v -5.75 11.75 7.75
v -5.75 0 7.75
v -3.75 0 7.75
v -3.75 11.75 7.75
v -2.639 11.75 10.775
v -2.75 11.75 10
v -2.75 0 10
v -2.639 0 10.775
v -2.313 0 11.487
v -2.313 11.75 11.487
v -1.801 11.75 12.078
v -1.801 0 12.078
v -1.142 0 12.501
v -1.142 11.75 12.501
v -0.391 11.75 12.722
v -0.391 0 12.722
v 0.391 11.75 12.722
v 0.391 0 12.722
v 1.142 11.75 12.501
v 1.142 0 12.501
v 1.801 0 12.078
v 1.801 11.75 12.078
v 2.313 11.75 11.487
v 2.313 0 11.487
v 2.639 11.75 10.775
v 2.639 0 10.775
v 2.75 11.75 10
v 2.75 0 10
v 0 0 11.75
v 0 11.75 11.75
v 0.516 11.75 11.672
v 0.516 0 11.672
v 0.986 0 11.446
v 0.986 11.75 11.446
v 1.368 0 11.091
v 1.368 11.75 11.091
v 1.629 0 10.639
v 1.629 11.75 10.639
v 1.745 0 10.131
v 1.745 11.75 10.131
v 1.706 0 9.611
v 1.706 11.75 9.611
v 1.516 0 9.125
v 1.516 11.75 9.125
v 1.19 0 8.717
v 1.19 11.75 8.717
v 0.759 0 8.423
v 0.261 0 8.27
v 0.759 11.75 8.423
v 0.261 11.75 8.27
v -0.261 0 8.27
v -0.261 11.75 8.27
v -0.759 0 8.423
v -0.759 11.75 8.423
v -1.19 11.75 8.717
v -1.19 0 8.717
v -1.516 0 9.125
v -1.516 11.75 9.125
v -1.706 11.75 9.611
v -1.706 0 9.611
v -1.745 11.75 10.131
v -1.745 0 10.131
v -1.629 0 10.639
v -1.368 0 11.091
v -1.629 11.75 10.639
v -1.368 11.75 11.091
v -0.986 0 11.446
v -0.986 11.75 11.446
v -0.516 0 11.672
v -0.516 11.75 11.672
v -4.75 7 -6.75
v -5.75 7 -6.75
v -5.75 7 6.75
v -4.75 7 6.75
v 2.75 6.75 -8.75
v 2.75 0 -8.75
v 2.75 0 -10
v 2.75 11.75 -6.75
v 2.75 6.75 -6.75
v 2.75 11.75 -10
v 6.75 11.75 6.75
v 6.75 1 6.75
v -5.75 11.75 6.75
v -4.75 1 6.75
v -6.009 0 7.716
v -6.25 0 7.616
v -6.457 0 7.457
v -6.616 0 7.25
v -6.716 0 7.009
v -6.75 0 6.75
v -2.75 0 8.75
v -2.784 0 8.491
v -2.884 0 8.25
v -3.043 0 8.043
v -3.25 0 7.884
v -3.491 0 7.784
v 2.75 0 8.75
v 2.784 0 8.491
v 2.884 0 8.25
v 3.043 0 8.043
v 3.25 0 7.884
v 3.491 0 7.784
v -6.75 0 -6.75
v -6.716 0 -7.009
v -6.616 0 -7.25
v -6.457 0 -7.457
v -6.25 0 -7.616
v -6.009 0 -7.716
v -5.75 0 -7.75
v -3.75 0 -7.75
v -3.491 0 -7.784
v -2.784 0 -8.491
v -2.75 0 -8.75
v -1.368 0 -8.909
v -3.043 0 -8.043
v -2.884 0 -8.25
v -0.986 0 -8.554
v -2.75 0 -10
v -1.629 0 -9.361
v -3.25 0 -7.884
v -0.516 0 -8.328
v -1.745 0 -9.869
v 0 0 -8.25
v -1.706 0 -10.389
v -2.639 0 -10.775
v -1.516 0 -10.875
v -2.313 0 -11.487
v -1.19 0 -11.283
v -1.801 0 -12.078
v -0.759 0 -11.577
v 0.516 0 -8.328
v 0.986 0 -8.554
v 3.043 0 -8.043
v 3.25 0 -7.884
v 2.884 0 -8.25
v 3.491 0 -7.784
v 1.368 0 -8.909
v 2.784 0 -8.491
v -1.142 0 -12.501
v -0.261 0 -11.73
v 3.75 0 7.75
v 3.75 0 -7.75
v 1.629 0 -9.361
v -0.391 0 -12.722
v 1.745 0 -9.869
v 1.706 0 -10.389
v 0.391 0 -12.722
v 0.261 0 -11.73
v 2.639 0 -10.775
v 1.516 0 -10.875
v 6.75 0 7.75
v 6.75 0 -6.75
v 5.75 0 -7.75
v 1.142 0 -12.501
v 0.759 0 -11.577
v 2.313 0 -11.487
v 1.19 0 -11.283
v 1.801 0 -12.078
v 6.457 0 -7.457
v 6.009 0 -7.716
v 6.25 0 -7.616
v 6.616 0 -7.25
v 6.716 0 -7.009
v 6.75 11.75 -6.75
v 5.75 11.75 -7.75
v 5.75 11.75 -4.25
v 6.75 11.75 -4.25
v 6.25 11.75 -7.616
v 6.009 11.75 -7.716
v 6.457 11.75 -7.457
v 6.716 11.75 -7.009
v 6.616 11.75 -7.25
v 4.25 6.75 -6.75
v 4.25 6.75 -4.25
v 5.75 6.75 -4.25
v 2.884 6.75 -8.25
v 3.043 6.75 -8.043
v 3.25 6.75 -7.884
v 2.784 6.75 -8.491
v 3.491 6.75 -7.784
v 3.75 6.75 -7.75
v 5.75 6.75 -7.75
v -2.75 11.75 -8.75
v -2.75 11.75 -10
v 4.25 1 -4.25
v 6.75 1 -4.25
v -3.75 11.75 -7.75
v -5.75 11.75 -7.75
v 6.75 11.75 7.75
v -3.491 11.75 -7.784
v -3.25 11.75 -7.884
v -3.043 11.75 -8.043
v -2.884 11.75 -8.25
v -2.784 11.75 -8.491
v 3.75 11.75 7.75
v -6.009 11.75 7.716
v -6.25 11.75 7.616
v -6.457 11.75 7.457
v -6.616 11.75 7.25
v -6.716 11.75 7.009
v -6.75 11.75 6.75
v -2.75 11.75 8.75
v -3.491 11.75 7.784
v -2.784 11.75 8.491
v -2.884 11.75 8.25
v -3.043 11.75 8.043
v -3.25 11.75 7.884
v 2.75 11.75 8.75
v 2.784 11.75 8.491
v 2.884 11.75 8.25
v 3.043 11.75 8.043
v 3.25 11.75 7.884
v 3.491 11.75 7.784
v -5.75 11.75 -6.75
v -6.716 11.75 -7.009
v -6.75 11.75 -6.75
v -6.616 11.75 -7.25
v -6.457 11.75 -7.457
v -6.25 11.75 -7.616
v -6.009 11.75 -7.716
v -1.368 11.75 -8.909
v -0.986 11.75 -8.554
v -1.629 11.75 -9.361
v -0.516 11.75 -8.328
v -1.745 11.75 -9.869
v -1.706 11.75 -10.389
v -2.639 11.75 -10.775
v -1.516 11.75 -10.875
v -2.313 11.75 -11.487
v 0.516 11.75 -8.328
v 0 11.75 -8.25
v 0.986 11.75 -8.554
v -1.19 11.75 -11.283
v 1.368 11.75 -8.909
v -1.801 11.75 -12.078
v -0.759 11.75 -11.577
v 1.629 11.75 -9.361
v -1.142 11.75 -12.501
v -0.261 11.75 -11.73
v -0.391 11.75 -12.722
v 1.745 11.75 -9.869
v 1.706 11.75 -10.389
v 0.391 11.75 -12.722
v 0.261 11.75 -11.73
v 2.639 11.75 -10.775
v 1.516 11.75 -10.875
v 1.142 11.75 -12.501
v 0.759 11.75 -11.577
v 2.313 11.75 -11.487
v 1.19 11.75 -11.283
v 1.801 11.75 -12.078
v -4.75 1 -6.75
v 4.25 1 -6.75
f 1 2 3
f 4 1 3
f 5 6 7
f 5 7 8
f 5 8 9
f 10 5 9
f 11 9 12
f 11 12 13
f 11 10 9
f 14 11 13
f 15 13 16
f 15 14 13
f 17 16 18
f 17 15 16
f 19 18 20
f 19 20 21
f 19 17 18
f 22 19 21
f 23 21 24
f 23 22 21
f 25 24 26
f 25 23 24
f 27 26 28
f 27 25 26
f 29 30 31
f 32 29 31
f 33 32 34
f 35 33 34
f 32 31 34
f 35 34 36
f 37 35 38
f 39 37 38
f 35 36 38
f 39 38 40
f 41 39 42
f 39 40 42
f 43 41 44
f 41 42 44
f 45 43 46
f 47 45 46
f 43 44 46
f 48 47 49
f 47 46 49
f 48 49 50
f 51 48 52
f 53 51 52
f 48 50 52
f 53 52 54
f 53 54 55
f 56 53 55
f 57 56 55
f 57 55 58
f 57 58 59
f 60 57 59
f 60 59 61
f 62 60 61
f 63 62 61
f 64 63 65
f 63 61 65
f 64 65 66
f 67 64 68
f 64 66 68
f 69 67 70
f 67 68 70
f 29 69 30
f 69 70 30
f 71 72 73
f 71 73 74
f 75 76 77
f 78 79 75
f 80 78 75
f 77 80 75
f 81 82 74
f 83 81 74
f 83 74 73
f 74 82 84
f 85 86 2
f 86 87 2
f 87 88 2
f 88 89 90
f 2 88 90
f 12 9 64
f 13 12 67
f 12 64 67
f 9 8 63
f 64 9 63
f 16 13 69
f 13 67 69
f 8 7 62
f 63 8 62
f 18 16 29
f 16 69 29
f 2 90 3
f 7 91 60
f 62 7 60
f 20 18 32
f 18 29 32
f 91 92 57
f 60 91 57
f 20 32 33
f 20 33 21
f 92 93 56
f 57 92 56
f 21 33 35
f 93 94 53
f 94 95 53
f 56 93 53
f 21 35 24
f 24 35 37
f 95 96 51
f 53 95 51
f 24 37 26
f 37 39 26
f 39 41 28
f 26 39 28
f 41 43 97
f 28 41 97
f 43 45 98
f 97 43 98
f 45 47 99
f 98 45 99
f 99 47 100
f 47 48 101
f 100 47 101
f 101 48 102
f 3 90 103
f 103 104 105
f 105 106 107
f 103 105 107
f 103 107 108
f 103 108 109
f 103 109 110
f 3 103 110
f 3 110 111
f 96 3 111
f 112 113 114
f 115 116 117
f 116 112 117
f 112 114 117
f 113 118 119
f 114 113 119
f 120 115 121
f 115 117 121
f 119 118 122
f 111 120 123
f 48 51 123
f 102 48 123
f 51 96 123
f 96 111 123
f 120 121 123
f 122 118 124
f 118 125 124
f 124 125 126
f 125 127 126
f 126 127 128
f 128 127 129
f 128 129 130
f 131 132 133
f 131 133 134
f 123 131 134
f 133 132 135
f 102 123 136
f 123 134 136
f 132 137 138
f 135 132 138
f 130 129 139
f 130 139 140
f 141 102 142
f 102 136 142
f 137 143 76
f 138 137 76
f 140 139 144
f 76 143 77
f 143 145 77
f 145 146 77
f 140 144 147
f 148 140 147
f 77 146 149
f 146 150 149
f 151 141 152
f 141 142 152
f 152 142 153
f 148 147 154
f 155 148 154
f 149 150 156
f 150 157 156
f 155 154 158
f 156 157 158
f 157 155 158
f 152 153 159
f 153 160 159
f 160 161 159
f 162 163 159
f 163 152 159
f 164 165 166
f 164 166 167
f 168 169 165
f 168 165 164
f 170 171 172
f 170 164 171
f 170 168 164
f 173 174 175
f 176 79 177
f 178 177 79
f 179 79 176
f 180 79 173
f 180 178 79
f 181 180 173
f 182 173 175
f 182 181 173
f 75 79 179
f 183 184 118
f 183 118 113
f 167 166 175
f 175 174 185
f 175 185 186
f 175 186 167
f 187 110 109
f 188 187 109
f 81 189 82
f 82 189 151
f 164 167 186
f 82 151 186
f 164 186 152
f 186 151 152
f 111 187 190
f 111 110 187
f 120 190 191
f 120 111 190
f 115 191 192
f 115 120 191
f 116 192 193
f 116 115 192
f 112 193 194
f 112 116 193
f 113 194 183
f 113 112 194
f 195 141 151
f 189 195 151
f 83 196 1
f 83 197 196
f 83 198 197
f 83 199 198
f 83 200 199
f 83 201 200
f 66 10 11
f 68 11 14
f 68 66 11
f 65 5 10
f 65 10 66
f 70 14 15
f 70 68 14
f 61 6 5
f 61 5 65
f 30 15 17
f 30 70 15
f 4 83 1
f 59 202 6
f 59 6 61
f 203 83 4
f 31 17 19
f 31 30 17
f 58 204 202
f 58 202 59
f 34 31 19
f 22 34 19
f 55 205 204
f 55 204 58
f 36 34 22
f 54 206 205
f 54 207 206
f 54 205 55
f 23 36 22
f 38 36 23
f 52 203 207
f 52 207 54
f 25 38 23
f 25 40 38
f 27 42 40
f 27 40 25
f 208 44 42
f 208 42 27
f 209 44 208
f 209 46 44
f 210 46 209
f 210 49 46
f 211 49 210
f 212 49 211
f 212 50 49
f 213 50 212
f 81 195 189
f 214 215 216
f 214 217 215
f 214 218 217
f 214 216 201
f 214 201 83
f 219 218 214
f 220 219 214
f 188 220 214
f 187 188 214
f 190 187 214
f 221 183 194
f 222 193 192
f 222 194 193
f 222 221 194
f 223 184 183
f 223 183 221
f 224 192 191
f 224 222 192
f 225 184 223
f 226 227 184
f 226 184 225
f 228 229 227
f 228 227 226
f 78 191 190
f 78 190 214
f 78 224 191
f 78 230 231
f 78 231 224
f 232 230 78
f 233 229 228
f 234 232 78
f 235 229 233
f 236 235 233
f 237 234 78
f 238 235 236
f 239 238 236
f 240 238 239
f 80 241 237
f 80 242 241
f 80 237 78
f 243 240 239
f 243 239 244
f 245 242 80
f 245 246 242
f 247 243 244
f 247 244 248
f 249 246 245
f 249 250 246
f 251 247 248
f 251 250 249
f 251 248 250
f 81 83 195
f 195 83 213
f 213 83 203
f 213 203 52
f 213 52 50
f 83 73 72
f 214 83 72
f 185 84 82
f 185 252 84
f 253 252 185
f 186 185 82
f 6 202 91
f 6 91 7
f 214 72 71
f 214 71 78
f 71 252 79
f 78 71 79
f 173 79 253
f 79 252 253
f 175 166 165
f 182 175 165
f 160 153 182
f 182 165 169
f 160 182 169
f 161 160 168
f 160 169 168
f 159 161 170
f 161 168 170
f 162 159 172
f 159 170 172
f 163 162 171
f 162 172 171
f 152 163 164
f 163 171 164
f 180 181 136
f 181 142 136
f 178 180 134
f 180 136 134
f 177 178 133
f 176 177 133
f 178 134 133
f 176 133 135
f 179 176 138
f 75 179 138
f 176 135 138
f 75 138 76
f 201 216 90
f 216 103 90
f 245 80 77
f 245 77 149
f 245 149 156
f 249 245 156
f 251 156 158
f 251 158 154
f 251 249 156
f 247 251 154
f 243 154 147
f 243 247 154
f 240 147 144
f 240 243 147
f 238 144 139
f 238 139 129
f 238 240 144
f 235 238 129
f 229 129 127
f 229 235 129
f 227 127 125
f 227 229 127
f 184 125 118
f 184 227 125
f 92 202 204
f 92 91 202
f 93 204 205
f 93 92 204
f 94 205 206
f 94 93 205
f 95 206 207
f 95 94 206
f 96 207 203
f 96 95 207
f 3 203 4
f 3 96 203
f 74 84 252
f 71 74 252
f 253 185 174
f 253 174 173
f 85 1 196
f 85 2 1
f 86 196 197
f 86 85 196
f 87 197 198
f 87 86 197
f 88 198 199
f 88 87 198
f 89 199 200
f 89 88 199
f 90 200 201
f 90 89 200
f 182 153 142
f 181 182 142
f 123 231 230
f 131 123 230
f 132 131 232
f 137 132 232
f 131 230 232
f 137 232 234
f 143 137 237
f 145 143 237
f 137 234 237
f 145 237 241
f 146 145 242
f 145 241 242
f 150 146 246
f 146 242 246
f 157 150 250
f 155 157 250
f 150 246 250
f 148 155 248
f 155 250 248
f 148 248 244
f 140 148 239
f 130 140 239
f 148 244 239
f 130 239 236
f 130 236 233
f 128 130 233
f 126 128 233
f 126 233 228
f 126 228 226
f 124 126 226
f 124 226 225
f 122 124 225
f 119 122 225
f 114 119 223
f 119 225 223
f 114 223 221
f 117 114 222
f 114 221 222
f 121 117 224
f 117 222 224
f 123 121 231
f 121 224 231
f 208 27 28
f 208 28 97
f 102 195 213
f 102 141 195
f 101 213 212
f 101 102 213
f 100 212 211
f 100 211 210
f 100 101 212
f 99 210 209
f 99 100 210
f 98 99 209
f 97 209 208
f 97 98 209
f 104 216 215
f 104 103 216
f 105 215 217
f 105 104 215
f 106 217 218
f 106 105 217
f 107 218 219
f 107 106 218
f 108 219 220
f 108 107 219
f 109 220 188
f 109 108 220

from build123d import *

# Parameters (mm, degrees)
SKETCH1_W           = 13.5
SKETCH1_H           = 15.5
SKETCH1_W_2         = 11.5
SKETCH1_H_2         = 13.5
BOSS_EXTRUDE1_DEPTH = 1
BOSS_EXTRUDE2_DEPTH = 10.75
SKETCH3_W           = 3
SKETCH3_H           = 1
CUT_EXTRUDE1_DEPTH  = 5
SKETCH4_R           = 1.75
BOSS_EXTRUDE3_DEPTH = 11.75
FILLET1_R           = 1
SKETCH5_W           = 1
SKETCH5_H           = 13.5
BOSS_EXTRUDE4_DEPTH = 6
SKETCH6_W           = 1.5
SKETCH6_H           = 2.5
BOSS_EXTRUDE5_DEPTH = 5.75


with BuildPart() as part:
    # Sketch1 → Boss-Extrude1 (new body)
    # profile 1 of 2: a face of its own
    with BuildSketch(Plane(origin=(0, 0, 0), x_dir=(1, 0, 0), z_dir=(0, 1, 0))):
        Rectangle(SKETCH1_W, SKETCH1_H)
        Rectangle(SKETCH1_W_2, SKETCH1_H_2, mode=Mode.SUBTRACT)
    # profile 2 of 2: a face of its own
    with BuildSketch(Plane(origin=(0, 0, 0), x_dir=(1, 0, 0), z_dir=(0, 1, 0))):
        Rectangle(SKETCH1_W_2, SKETCH1_H_2)
    extrude(amount=BOSS_EXTRUDE1_DEPTH)

    # Sketch2 → Boss-Extrude2 (add)
    with BuildSketch(Plane(origin=(0, 1, 0), x_dir=(1, 0, 0), z_dir=(0, 1, 0))):
        Polygon((-6.75, -7.75), (6.75, -7.75), (6.75, -6.75), (5.75, -6.75), (-5.75, -6.75), (-5.75, 6.75), (5.75, 6.75), (5.75, 4.25), (6.75, 4.25), (6.75, 7.75), (-6.75, 7.75), align=None)
    extrude(amount=BOSS_EXTRUDE2_DEPTH)

    # Sketch3 → Cut-Extrude1 (cut)
    with BuildSketch(Plane(origin=(0, 11.75, 0), x_dir=(1, 0, 0), z_dir=(0, 1, 0))):
        with Locations((4.25, 7.25)):
            Rectangle(SKETCH3_W, SKETCH3_H)
    extrude(amount=-CUT_EXTRUDE1_DEPTH, mode=Mode.SUBTRACT)

    # Sketch4 → Boss-Extrude3 (add)
    # profile 1 of 6: a face of its own
    with BuildSketch(Plane(origin=(0, 11.75, 0), x_dir=(1, 0, 0), z_dir=(0, 1, 0))):
        with BuildLine():
            ThreePointArc((2.75, 10), (0, 12.75), (-2.75, 10))
            ThreePointArc((-2.75, 10), (-2.440351592, 8.732252348), (-1.58113883, 7.75))
            Line((-1.58113883, 7.75), (1.58113883, 7.75))
            ThreePointArc((1.58113883, 7.75), (2.440351592, 8.732252348), (2.75, 10))
        make_face()
        with Locations(Location((0, 10, 0), (0, 0, 270))):
            Circle(SKETCH4_R, mode=Mode.SUBTRACT)
    # profile 2 of 6: a face of its own
    with BuildSketch(Plane(origin=(0, 11.75, 0), x_dir=(1, 0, 0), z_dir=(0, 1, 0))):
        with BuildLine():
            ThreePointArc((-1.58113883, 7.75), (-2.440351592, 8.732252348), (-2.75, 10))
            Line((-2.75, 10), (-2.75, 7.75))
            Line((-2.75, 7.75), (-1.58113883, 7.75))
        make_face()
    # profile 3 of 6: a face of its own
    with BuildSketch(Plane(origin=(0, 11.75, 0), x_dir=(1, 0, 0), z_dir=(0, 1, 0))):
        with BuildLine():
            Line((2.75, 7.75), (2.75, 10))
            ThreePointArc((2.75, 10), (2.440351592, 8.732252348), (1.58113883, 7.75))
            Line((1.58113883, 7.75), (2.75, 7.75))
        make_face()
    # profile 4 of 6: a face of its own
    with BuildSketch(Plane(origin=(0, 11.75, 0), x_dir=(1, 0, 0), z_dir=(0, 1, 0))):
        with BuildLine():
            Line((-2.75, -7.75), (-2.75, -10))
            ThreePointArc((-2.75, -10), (-2.440351592, -8.732252348), (-1.58113883, -7.75))
            Line((-1.58113883, -7.75), (-2.75, -7.75))
        make_face()
    # profile 5 of 6: a face of its own
    with BuildSketch(Plane(origin=(0, 11.75, 0), x_dir=(1, 0, 0), z_dir=(0, 1, 0))):
        with BuildLine():
            ThreePointArc((-1.58113883, -7.75), (-2.440351592, -8.732252348), (-2.75, -10))
            ThreePointArc((-2.75, -10), (0, -12.75), (2.75, -10))
            ThreePointArc((2.75, -10), (2.440351592, -8.732252348), (1.58113883, -7.75))
            Line((1.58113883, -7.75), (-1.58113883, -7.75))
        make_face()
        with Locations(Location((0, -10, 0), (0, 0, 270))):
            Circle(SKETCH4_R, mode=Mode.SUBTRACT)
    # profile 6 of 6: a face of its own
    with BuildSketch(Plane(origin=(0, 11.75, 0), x_dir=(1, 0, 0), z_dir=(0, 1, 0))):
        with BuildLine():
            ThreePointArc((1.58113883, -7.75), (2.440351592, -8.732252348), (2.75, -10))
            Line((2.75, -10), (2.75, -7.75))
            Line((2.75, -7.75), (1.58113883, -7.75))
        make_face()
    extrude(amount=-BOSS_EXTRUDE3_DEPTH)

    # Fillet1
    fillet1_edges = [part.edges().sort_by_distance(p)[0] for p in [
        (-2.75, 5.875, -7.75),
        (2.75, 3.375, -7.75),
        (-2.75, 5.875, 7.75),
        (2.75, 5.875, 7.75),
        (-6.75, 5.875, 7.75),
        (-6.75, 5.875, -7.75),
        (6.75, 5.875, -7.75),
    ]]
    fillet(fillet1_edges, radius=FILLET1_R)

    # Sketch5 → Boss-Extrude4 (add)
    with BuildSketch(Plane(origin=(0, 1, 0), x_dir=(1, 0, 0), z_dir=(0, 1, 0))):
        with Locations((-5.25, 0)):
            Rectangle(SKETCH5_W, SKETCH5_H)
    extrude(amount=BOSS_EXTRUDE4_DEPTH)

    # Sketch6 → Boss-Extrude5 (add)
    with BuildSketch(Plane(origin=(0, 1, 0), x_dir=(1, 0, 0), z_dir=(0, 1, 0))):
        with Locations((5, 5.5)):
            Rectangle(SKETCH6_W, SKETCH6_H)
    extrude(amount=BOSS_EXTRUDE5_DEPTH)


solid = part.part
